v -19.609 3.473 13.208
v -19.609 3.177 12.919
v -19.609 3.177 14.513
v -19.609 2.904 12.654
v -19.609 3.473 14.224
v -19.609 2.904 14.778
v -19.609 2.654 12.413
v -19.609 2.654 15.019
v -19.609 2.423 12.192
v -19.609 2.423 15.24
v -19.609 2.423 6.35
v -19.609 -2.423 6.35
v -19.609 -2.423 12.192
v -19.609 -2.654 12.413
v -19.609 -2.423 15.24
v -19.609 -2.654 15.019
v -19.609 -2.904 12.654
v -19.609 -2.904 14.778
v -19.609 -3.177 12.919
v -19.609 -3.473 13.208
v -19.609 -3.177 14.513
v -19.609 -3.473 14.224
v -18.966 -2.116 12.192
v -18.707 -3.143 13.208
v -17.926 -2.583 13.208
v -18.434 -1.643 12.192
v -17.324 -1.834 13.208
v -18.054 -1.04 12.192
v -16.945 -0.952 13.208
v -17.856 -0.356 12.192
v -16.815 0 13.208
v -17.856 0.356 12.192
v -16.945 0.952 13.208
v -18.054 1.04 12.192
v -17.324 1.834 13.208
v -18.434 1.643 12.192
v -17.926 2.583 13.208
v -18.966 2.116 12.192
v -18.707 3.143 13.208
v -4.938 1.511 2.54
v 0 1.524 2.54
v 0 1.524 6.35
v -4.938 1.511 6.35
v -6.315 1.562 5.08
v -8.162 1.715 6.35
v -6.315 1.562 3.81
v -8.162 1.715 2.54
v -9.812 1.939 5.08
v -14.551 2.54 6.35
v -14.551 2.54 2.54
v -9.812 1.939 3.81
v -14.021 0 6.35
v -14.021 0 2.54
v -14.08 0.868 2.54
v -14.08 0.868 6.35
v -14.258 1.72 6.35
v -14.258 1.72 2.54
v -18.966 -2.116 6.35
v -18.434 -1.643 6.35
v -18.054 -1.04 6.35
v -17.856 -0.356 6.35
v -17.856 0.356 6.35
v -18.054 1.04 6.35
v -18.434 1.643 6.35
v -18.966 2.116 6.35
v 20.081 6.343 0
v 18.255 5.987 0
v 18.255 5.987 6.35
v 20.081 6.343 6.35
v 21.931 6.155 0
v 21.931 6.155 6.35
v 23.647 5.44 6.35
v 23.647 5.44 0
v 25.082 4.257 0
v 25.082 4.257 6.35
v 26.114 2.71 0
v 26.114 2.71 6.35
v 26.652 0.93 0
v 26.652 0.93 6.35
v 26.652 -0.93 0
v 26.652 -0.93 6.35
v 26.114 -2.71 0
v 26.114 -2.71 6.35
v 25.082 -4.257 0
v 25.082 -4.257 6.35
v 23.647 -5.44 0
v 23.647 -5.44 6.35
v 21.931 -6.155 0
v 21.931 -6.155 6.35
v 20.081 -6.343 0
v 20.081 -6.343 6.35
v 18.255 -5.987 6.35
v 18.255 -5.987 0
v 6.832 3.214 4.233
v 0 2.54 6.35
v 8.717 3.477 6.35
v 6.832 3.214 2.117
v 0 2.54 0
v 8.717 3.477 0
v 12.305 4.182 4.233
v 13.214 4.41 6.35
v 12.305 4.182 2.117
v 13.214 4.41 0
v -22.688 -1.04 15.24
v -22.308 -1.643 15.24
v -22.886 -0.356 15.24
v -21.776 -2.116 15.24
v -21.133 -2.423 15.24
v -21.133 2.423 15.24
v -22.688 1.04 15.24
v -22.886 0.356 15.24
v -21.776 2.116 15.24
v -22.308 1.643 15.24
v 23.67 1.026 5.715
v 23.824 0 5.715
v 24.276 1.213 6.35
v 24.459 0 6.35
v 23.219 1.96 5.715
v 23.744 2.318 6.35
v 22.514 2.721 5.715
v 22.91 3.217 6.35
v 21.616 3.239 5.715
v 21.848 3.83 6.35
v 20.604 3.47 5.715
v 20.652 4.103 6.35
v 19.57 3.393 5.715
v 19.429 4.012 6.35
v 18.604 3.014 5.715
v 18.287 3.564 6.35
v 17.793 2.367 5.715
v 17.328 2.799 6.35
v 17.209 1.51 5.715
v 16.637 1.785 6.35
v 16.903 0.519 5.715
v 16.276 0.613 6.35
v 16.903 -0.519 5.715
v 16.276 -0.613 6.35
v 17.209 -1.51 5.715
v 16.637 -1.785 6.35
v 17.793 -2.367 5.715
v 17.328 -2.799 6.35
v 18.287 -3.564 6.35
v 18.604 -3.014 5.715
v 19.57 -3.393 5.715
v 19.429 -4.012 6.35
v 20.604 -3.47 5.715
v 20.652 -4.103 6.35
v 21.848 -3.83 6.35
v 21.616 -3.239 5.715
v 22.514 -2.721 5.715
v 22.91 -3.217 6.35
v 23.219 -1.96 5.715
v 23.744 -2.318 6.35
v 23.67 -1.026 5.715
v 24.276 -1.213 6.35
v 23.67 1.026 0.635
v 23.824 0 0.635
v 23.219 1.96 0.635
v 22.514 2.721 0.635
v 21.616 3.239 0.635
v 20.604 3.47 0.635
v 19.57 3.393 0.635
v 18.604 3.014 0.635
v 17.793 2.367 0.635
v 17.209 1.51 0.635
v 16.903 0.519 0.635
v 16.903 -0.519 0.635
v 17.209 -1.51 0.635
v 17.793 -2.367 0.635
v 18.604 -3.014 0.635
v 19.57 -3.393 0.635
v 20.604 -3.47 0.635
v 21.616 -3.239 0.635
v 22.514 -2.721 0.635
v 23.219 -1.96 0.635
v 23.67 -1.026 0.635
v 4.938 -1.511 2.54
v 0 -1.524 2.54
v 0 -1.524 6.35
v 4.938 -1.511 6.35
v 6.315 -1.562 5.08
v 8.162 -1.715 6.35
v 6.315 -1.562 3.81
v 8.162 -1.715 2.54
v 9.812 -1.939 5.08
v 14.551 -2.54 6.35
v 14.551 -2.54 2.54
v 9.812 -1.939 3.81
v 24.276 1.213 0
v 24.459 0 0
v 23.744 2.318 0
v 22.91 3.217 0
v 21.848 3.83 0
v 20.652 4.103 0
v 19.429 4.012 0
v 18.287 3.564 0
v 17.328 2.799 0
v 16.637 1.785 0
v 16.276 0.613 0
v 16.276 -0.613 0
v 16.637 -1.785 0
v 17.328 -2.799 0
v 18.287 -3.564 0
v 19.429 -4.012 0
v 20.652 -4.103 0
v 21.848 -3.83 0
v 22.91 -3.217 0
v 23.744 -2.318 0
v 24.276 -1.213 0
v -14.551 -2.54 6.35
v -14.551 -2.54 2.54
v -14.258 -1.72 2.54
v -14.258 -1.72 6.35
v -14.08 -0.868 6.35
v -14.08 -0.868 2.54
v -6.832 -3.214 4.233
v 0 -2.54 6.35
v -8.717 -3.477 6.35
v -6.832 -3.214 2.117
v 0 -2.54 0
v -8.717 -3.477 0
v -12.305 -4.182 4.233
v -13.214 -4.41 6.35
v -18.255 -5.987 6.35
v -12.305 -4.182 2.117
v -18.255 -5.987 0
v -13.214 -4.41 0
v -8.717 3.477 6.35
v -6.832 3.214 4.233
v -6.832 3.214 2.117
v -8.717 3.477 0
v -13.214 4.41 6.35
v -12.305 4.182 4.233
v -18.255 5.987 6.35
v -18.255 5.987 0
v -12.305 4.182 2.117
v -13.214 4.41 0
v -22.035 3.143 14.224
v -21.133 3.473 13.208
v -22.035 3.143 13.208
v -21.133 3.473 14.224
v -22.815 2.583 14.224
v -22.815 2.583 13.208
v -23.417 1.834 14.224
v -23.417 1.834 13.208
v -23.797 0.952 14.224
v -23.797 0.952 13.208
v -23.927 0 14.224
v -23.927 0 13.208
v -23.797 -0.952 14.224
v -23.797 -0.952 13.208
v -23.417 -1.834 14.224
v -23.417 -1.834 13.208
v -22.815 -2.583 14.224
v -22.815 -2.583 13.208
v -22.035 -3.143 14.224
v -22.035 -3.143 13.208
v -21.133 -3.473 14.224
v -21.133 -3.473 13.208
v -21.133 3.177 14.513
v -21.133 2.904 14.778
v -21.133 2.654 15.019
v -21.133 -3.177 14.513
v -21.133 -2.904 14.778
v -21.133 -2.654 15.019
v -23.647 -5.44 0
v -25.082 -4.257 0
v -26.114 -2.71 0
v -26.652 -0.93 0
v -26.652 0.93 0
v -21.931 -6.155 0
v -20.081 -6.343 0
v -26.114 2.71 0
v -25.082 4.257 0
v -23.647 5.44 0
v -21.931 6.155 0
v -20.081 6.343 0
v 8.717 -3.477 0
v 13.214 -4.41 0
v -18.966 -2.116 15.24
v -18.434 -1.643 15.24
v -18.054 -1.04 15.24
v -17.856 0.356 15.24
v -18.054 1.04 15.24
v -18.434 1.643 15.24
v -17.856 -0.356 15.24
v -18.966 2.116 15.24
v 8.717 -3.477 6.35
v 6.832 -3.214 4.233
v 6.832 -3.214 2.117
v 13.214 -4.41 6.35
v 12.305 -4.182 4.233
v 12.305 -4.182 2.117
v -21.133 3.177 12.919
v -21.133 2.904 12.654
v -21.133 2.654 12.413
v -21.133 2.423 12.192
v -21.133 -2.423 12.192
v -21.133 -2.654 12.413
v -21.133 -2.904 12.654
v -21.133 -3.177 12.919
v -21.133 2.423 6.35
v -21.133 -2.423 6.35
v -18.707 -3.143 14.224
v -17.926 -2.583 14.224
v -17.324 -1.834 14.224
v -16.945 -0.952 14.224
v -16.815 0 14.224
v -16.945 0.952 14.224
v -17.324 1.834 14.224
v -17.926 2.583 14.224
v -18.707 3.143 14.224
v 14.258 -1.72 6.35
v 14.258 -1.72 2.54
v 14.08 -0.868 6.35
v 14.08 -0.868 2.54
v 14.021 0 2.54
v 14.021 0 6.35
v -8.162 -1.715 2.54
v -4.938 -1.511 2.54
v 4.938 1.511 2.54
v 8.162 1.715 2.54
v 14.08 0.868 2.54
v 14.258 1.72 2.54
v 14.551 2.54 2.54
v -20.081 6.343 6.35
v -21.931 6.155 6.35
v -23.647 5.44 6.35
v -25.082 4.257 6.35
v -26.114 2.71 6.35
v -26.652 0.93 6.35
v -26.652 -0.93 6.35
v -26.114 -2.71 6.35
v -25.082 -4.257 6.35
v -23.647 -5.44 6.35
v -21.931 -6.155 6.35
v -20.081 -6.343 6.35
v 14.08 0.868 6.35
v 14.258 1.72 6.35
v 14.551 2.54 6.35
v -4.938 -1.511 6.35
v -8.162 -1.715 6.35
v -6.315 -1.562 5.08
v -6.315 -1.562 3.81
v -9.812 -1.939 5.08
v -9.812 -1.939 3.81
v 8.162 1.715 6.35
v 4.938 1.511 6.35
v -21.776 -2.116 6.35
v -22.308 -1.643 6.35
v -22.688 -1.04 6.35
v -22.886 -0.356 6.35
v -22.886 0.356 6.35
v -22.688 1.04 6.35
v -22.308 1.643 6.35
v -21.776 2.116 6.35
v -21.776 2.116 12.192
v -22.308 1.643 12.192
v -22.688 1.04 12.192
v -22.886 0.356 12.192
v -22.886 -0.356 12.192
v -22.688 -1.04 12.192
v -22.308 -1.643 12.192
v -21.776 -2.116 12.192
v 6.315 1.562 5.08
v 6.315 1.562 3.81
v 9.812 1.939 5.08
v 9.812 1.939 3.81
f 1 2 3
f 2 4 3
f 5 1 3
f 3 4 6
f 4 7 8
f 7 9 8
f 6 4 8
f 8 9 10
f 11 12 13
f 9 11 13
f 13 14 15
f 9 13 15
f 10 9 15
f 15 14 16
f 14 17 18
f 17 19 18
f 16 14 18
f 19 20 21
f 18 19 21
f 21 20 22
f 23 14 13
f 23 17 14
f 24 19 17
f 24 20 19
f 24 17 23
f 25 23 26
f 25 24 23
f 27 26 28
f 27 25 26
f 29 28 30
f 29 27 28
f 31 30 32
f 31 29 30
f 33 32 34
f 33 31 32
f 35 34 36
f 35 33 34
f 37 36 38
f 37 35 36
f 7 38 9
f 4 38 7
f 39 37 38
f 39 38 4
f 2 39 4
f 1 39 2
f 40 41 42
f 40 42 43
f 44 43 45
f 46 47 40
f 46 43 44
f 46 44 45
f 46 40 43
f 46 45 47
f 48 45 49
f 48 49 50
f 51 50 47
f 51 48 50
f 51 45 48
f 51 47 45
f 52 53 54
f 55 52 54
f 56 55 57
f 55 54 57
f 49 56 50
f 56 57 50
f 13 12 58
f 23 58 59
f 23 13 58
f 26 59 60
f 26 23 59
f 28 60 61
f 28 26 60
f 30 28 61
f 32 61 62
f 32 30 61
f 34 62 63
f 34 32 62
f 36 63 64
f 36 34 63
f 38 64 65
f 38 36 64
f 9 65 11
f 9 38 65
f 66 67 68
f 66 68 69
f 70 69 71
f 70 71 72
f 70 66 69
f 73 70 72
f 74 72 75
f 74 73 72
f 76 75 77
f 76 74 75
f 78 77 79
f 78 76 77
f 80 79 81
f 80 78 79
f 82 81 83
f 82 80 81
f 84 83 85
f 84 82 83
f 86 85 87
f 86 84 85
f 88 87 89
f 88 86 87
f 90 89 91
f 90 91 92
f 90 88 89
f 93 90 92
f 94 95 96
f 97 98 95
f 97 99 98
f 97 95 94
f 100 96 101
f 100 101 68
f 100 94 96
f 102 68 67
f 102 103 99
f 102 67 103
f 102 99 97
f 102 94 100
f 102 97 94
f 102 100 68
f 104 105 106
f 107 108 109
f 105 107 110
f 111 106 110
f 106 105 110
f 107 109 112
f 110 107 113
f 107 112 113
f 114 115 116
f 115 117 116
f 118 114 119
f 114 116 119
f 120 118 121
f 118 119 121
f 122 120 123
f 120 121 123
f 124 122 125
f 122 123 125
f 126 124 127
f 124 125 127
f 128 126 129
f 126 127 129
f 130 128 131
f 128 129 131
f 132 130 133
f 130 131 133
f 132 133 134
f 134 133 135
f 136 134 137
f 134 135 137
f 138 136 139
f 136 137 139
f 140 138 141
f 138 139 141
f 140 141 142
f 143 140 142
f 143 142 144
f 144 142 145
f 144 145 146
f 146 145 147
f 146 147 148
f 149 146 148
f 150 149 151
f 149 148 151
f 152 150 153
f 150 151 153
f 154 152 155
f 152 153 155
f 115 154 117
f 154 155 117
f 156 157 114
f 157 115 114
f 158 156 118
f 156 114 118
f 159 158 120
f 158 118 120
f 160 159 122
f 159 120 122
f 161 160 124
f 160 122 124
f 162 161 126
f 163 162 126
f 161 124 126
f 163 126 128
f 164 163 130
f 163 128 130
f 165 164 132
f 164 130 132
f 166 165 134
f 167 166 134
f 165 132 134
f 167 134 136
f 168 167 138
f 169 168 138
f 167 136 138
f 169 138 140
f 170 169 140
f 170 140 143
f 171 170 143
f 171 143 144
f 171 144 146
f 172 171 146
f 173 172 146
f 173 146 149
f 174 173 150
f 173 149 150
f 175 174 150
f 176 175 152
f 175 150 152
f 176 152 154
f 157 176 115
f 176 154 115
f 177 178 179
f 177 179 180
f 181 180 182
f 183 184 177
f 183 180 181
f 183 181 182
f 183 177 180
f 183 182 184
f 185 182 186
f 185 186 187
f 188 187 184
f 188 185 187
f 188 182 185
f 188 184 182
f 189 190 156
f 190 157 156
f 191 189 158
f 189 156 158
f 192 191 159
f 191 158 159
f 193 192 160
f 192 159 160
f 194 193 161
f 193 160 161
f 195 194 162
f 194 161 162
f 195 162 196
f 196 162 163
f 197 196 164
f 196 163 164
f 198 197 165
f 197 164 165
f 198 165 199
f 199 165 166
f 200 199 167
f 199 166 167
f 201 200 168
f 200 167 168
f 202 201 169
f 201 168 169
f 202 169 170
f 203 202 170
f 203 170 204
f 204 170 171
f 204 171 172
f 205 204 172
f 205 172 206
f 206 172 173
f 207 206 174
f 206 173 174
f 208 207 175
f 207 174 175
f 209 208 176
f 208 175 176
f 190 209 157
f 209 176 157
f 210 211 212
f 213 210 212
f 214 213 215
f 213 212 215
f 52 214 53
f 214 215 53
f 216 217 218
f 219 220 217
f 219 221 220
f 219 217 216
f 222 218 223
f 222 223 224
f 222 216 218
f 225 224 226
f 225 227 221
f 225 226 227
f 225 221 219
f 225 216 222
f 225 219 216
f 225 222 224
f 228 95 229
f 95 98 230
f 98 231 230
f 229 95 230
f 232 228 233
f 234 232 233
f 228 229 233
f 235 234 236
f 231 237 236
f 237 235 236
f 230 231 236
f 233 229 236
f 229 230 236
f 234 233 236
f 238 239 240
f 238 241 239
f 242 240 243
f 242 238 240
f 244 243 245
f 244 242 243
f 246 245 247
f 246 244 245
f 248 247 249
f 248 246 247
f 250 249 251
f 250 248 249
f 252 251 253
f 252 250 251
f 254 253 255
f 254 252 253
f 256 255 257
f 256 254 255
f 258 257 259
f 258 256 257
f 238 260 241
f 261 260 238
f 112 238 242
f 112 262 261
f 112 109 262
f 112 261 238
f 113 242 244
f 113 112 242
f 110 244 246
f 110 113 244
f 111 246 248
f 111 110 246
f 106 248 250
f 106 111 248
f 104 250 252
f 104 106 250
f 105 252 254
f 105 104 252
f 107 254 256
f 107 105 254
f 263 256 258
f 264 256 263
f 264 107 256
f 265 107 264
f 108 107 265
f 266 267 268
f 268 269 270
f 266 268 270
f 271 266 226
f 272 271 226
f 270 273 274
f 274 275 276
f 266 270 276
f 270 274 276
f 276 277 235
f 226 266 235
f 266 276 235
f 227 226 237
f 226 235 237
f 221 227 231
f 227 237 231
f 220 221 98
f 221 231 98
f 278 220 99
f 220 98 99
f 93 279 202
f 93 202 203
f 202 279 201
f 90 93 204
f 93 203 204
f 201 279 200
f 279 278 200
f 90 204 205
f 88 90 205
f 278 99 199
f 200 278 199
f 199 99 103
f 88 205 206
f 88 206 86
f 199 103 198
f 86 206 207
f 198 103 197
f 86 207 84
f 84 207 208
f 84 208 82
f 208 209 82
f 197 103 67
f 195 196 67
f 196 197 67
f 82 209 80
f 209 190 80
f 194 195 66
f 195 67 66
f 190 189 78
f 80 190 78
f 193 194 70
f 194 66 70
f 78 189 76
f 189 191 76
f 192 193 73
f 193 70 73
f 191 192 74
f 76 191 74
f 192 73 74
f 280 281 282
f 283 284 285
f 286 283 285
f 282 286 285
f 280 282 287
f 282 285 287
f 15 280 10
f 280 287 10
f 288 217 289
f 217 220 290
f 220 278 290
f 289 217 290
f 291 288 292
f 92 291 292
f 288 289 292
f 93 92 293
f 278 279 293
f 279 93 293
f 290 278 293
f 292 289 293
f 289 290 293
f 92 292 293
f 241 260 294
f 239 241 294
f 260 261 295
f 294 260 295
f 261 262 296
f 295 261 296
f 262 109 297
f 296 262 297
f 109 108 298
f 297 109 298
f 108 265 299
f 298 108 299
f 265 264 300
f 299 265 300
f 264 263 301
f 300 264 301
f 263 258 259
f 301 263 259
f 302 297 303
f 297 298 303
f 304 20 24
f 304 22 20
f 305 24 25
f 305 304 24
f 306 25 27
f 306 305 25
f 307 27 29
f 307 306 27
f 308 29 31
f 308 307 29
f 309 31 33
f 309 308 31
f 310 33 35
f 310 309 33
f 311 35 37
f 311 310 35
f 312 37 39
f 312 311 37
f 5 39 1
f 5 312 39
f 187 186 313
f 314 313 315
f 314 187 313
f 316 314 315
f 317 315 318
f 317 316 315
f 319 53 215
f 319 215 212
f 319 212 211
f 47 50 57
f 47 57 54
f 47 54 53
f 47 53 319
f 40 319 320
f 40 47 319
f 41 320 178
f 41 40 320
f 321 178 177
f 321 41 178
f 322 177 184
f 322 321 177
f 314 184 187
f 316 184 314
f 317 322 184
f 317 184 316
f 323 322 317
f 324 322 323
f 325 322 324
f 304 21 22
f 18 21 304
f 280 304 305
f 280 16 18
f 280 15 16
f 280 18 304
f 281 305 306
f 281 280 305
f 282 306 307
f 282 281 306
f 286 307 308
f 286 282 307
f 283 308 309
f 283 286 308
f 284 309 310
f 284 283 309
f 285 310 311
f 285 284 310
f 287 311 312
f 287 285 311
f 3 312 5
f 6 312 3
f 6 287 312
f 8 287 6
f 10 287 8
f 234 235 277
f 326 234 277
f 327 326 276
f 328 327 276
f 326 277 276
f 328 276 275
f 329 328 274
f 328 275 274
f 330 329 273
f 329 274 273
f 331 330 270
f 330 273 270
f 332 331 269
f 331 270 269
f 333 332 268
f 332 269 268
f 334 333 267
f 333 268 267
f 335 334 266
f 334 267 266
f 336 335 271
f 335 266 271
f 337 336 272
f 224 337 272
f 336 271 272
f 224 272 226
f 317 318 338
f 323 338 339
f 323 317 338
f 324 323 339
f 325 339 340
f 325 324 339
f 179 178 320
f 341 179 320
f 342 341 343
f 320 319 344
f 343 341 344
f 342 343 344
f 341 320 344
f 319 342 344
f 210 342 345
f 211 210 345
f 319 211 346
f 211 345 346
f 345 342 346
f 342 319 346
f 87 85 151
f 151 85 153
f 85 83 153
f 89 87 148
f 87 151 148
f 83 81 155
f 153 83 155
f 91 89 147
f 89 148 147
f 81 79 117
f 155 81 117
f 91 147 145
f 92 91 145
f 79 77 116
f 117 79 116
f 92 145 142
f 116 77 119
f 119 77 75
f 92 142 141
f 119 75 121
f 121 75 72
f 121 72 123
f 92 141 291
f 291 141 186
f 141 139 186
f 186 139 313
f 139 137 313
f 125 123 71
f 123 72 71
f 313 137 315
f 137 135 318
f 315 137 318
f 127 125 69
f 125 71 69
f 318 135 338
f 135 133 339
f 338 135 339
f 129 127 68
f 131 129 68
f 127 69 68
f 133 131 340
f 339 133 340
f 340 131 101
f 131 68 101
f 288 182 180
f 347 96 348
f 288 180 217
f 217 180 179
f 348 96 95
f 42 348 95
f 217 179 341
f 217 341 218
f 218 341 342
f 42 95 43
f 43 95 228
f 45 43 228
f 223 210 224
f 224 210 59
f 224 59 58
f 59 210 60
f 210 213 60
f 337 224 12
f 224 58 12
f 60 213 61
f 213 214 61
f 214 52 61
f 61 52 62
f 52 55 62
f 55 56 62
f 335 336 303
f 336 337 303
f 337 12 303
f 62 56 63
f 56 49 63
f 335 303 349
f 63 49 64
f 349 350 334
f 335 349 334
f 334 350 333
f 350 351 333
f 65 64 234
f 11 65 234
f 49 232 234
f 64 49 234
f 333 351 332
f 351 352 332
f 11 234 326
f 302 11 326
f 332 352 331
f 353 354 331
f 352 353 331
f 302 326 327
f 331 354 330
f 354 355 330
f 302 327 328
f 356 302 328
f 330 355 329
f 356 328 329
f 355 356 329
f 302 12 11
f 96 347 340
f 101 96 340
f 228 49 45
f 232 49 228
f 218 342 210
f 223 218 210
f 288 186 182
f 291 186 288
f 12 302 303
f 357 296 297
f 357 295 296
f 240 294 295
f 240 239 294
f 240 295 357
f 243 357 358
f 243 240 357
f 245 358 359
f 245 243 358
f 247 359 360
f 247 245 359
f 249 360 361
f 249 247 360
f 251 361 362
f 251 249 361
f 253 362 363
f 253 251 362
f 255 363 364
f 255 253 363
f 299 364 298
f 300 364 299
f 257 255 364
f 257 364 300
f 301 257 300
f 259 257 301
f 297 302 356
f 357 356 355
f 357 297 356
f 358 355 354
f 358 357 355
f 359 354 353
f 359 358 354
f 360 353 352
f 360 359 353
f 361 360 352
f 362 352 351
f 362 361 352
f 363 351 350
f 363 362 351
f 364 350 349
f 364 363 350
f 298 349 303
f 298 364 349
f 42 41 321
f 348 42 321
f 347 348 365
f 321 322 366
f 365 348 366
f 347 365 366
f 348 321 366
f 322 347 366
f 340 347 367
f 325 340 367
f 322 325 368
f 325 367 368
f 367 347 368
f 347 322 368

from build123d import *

# Parameters (mm, degrees)
F2_DEPTH = 6.35
F1_W     = 1.778
F1_H     = 3.048
F1_H_2   = 5.842
F1_W_2   = 0.762
F5_DEPTH = 12.7
F6_DEPTH = 2.54


# Not quite as in the source:
# - a pattern or mirror of a feature is missing from the dataset's text; its kind, count and spacing are read off the source's solid
# - a feature names something its author has since deleted; it is built from what else it names


with BuildPart() as f2:
    # F0 (on Top) → F2 (new body)
    with BuildSketch(Plane.XY):
        with BuildLine():
            ThreePointArc((-14.5509208863, -2.5399817128), (-14.1547428746, -1.2973564714), (-14.0208, 0))
            ThreePointArc((-14.0208, 0), (-14.1547428746, 1.2973564714), (-14.5509208863, 2.5399817128))
            ThreePointArc((-14.5509208863, 2.5399817128), (-16.0448887373, 4.6485472727), (-18.2552900028, 5.9872462328))
            ThreePointArc((-18.2552900028, 5.9872462328), (-26.7208, 0), (-18.2552900028, -5.9872462328))
            ThreePointArc((-18.2552900028, -5.9872462328), (-16.0448887373, -4.6485472727), (-14.5509208863, -2.5399817128))
        make_face()
        with BuildLine():
            ThreePointArc((-18.2552900028, 5.9872462328), (-16.0448887373, 4.6485472727), (-14.5509208863, 2.5399817128))
            add(Edge.make_bspline(
                [(0, 1.524), (-9.0764431036, 1.3546369813), (-7.8380626316, 1.8652065321), (-14.5509208863, 2.5399817128)],
                knots=[0, 0, 0, 0, 14.5863469546, 14.5863469546, 14.5863469546, 14.5863469546], degree=3))
            add(Edge.make_bspline(
                [(0, 1.524), (9.0764431036, 1.3546369813), (7.8380626316, 1.8652065321), (14.5509208863, 2.5399817128)],
                knots=[0, 0, 0, 0, 14.5863469546, 14.5863469546, 14.5863469546, 14.5863469546], degree=3))
            ThreePointArc((14.5509208863, 2.5399817128), (16.0448887373, 4.6485472727), (18.2552900028, 5.9872462328))
            add(Edge.make_bspline(
                [(0, 2.54), (8.1250406802, 3.246476237), (11.4529688686, 3.5837408809), (18.2552900028, 5.9872462328)],
                knots=[0, 0, 0, 0, 18.5779202193, 18.5779202193, 18.5779202193, 18.5779202193], degree=3))
            add(Edge.make_bspline(
                [(0, 2.54), (-8.1250406802, 3.246476237), (-11.4529688686, 3.5837408809), (-18.2552900028, 5.9872462328)],
                knots=[0, 0, 0, 0, 18.5779202193, 18.5779202193, 18.5779202193, 18.5779202193], degree=3))
        make_face()
        with BuildLine():
            add(Edge.make_bspline(
                [(0, -1.524), (-9.0764431036, -1.3546369813), (-7.8380626316, -1.8652065321), (-14.5509208863, -2.5399817128)],
                knots=[0, 0, 0, 0, 14.5863469546, 14.5863469546, 14.5863469546, 14.5863469546], degree=3))
            ThreePointArc((-14.5509208863, -2.5399817128), (-16.0448887373, -4.6485472727), (-18.2552900028, -5.9872462328))
            add(Edge.make_bspline(
                [(0, -2.54), (-8.1250406802, -3.246476237), (-11.4529688686, -3.5837408809), (-18.2552900028, -5.9872462328)],
                knots=[0, 0, 0, 0, 18.5779202193, 18.5779202193, 18.5779202193, 18.5779202193], degree=3))
            add(Edge.make_bspline(
                [(0, -2.54), (8.1250406802, -3.246476237), (11.4529688686, -3.5837408809), (18.2552900028, -5.9872462328)],
                knots=[0, 0, 0, 0, 18.5779202193, 18.5779202193, 18.5779202193, 18.5779202193], degree=3))
            ThreePointArc((18.2552900028, -5.9872462328), (16.0448887373, -4.6485472727), (14.5509208863, -2.5399817128))
            add(Edge.make_bspline(
                [(0, -1.524), (9.0764431036, -1.3546369813), (7.8380626316, -1.8652065321), (14.5509208863, -2.5399817128)],
                knots=[0, 0, 0, 0, 14.5863469546, 14.5863469546, 14.5863469546, 14.5863469546], degree=3))
        make_face()
    extrude(amount=F2_DEPTH)

    # F2_copies: F2 across plane


with BuildPart() as f2_1:
    add(f2.part)
    add(f2.part.mirror(Plane(origin=(0, 0, 0), x_dir=(0, 0, 1), z_dir=(1, 0, 0))))

    # F1 (on Front) → F3 (revolve, cut)
    with BuildSketch(Plane.XZ):
        Polygon((20.344351037, 6.35), (20.344351037, 0), (24.459151037, 0), (23.824151037, 0.635), (23.824151037, 5.715), (24.459151037, 6.35), align=None)
    revolve(axis=Axis((20.344351037, 0, 3.175), (0, 0, 1)), mode=Mode.SUBTRACT)

    # F1 (on Front) → F4 (revolve)
    with BuildSketch(Plane.XZ):
        Polygon((-17.8308, 15.24), (-17.8308, 12.192), (-16.8148, 13.208), (-16.8148, 14.224), align=None)
        with Locations((-18.7198, 13.716)):
            Rectangle(F1_W, F1_H)
        with Locations((-22.0218, 13.716)):
            Rectangle(F1_W, F1_H)
        Polygon((-23.9268, 13.208), (-22.9108, 12.192), (-22.9108, 15.24), (-23.9268, 14.224), align=None)
        with Locations((-22.0218, 9.271)):
            Rectangle(F1_W, F1_H_2)
        with Locations((-18.7198, 9.271)):
            Rectangle(F1_W, F1_H_2)
    revolve(axis=Axis((-20.3708, 0, 10.795), (0, 0, 1)))

    # F1 (on Front) → F5 (cut, symmetric)
    with BuildSketch(Plane.XZ):
        with Locations((-19.9898, 13.716)):
            Rectangle(F1_W_2, F1_H)
        with Locations((-20.7518, 13.716)):
            Rectangle(F1_W_2, F1_H)
        with Locations((-19.9898, 9.271)):
            Rectangle(F1_W_2, F1_H_2)
        with Locations((-20.7518, 9.271)):
            Rectangle(F1_W_2, F1_H_2)
    extrude(amount=F5_DEPTH, both=True, mode=Mode.SUBTRACT)

    # F0 (on Top) → F6 (join)
    with BuildSketch(Plane.XY):
        with BuildLine():
            ThreePointArc((-14.5509208863, 2.5399817128), (-14.1547428746, 1.2973564714), (-14.0208, 0))
            ThreePointArc((-14.0208, 0), (-14.1547428746, -1.2973564714), (-14.5509208863, -2.5399817128))
            add(Edge.make_bspline(
                [(0, -1.524), (-9.0764431036, -1.3546369813), (-7.8380626316, -1.8652065321), (-14.5509208863, -2.5399817128)],
                knots=[0, 0, 0, 0, 14.5863469546, 14.5863469546, 14.5863469546, 14.5863469546], degree=3))
            add(Edge.make_bspline(
                [(0, -1.524), (9.0764431036, -1.3546369813), (7.8380626316, -1.8652065321), (14.5509208863, -2.5399817128)],
                knots=[0, 0, 0, 0, 14.5863469546, 14.5863469546, 14.5863469546, 14.5863469546], degree=3))
            ThreePointArc((14.5509208863, -2.5399817128), (14.0208, 0), (14.5509208863, 2.5399817128))
            add(Edge.make_bspline(
                [(0, 1.524), (9.0764431036, 1.3546369813), (7.8380626316, 1.8652065321), (14.5509208863, 2.5399817128)],
                knots=[0, 0, 0, 0, 14.5863469546, 14.5863469546, 14.5863469546, 14.5863469546], degree=3))
            add(Edge.make_bspline(
                [(0, 1.524), (-9.0764431036, 1.3546369813), (-7.8380626316, 1.8652065321), (-14.5509208863, 2.5399817128)],
                knots=[0, 0, 0, 0, 14.5863469546, 14.5863469546, 14.5863469546, 14.5863469546], degree=3))
        make_face()
    extrude(amount=F6_DEPTH)


solid = f2_1.part
